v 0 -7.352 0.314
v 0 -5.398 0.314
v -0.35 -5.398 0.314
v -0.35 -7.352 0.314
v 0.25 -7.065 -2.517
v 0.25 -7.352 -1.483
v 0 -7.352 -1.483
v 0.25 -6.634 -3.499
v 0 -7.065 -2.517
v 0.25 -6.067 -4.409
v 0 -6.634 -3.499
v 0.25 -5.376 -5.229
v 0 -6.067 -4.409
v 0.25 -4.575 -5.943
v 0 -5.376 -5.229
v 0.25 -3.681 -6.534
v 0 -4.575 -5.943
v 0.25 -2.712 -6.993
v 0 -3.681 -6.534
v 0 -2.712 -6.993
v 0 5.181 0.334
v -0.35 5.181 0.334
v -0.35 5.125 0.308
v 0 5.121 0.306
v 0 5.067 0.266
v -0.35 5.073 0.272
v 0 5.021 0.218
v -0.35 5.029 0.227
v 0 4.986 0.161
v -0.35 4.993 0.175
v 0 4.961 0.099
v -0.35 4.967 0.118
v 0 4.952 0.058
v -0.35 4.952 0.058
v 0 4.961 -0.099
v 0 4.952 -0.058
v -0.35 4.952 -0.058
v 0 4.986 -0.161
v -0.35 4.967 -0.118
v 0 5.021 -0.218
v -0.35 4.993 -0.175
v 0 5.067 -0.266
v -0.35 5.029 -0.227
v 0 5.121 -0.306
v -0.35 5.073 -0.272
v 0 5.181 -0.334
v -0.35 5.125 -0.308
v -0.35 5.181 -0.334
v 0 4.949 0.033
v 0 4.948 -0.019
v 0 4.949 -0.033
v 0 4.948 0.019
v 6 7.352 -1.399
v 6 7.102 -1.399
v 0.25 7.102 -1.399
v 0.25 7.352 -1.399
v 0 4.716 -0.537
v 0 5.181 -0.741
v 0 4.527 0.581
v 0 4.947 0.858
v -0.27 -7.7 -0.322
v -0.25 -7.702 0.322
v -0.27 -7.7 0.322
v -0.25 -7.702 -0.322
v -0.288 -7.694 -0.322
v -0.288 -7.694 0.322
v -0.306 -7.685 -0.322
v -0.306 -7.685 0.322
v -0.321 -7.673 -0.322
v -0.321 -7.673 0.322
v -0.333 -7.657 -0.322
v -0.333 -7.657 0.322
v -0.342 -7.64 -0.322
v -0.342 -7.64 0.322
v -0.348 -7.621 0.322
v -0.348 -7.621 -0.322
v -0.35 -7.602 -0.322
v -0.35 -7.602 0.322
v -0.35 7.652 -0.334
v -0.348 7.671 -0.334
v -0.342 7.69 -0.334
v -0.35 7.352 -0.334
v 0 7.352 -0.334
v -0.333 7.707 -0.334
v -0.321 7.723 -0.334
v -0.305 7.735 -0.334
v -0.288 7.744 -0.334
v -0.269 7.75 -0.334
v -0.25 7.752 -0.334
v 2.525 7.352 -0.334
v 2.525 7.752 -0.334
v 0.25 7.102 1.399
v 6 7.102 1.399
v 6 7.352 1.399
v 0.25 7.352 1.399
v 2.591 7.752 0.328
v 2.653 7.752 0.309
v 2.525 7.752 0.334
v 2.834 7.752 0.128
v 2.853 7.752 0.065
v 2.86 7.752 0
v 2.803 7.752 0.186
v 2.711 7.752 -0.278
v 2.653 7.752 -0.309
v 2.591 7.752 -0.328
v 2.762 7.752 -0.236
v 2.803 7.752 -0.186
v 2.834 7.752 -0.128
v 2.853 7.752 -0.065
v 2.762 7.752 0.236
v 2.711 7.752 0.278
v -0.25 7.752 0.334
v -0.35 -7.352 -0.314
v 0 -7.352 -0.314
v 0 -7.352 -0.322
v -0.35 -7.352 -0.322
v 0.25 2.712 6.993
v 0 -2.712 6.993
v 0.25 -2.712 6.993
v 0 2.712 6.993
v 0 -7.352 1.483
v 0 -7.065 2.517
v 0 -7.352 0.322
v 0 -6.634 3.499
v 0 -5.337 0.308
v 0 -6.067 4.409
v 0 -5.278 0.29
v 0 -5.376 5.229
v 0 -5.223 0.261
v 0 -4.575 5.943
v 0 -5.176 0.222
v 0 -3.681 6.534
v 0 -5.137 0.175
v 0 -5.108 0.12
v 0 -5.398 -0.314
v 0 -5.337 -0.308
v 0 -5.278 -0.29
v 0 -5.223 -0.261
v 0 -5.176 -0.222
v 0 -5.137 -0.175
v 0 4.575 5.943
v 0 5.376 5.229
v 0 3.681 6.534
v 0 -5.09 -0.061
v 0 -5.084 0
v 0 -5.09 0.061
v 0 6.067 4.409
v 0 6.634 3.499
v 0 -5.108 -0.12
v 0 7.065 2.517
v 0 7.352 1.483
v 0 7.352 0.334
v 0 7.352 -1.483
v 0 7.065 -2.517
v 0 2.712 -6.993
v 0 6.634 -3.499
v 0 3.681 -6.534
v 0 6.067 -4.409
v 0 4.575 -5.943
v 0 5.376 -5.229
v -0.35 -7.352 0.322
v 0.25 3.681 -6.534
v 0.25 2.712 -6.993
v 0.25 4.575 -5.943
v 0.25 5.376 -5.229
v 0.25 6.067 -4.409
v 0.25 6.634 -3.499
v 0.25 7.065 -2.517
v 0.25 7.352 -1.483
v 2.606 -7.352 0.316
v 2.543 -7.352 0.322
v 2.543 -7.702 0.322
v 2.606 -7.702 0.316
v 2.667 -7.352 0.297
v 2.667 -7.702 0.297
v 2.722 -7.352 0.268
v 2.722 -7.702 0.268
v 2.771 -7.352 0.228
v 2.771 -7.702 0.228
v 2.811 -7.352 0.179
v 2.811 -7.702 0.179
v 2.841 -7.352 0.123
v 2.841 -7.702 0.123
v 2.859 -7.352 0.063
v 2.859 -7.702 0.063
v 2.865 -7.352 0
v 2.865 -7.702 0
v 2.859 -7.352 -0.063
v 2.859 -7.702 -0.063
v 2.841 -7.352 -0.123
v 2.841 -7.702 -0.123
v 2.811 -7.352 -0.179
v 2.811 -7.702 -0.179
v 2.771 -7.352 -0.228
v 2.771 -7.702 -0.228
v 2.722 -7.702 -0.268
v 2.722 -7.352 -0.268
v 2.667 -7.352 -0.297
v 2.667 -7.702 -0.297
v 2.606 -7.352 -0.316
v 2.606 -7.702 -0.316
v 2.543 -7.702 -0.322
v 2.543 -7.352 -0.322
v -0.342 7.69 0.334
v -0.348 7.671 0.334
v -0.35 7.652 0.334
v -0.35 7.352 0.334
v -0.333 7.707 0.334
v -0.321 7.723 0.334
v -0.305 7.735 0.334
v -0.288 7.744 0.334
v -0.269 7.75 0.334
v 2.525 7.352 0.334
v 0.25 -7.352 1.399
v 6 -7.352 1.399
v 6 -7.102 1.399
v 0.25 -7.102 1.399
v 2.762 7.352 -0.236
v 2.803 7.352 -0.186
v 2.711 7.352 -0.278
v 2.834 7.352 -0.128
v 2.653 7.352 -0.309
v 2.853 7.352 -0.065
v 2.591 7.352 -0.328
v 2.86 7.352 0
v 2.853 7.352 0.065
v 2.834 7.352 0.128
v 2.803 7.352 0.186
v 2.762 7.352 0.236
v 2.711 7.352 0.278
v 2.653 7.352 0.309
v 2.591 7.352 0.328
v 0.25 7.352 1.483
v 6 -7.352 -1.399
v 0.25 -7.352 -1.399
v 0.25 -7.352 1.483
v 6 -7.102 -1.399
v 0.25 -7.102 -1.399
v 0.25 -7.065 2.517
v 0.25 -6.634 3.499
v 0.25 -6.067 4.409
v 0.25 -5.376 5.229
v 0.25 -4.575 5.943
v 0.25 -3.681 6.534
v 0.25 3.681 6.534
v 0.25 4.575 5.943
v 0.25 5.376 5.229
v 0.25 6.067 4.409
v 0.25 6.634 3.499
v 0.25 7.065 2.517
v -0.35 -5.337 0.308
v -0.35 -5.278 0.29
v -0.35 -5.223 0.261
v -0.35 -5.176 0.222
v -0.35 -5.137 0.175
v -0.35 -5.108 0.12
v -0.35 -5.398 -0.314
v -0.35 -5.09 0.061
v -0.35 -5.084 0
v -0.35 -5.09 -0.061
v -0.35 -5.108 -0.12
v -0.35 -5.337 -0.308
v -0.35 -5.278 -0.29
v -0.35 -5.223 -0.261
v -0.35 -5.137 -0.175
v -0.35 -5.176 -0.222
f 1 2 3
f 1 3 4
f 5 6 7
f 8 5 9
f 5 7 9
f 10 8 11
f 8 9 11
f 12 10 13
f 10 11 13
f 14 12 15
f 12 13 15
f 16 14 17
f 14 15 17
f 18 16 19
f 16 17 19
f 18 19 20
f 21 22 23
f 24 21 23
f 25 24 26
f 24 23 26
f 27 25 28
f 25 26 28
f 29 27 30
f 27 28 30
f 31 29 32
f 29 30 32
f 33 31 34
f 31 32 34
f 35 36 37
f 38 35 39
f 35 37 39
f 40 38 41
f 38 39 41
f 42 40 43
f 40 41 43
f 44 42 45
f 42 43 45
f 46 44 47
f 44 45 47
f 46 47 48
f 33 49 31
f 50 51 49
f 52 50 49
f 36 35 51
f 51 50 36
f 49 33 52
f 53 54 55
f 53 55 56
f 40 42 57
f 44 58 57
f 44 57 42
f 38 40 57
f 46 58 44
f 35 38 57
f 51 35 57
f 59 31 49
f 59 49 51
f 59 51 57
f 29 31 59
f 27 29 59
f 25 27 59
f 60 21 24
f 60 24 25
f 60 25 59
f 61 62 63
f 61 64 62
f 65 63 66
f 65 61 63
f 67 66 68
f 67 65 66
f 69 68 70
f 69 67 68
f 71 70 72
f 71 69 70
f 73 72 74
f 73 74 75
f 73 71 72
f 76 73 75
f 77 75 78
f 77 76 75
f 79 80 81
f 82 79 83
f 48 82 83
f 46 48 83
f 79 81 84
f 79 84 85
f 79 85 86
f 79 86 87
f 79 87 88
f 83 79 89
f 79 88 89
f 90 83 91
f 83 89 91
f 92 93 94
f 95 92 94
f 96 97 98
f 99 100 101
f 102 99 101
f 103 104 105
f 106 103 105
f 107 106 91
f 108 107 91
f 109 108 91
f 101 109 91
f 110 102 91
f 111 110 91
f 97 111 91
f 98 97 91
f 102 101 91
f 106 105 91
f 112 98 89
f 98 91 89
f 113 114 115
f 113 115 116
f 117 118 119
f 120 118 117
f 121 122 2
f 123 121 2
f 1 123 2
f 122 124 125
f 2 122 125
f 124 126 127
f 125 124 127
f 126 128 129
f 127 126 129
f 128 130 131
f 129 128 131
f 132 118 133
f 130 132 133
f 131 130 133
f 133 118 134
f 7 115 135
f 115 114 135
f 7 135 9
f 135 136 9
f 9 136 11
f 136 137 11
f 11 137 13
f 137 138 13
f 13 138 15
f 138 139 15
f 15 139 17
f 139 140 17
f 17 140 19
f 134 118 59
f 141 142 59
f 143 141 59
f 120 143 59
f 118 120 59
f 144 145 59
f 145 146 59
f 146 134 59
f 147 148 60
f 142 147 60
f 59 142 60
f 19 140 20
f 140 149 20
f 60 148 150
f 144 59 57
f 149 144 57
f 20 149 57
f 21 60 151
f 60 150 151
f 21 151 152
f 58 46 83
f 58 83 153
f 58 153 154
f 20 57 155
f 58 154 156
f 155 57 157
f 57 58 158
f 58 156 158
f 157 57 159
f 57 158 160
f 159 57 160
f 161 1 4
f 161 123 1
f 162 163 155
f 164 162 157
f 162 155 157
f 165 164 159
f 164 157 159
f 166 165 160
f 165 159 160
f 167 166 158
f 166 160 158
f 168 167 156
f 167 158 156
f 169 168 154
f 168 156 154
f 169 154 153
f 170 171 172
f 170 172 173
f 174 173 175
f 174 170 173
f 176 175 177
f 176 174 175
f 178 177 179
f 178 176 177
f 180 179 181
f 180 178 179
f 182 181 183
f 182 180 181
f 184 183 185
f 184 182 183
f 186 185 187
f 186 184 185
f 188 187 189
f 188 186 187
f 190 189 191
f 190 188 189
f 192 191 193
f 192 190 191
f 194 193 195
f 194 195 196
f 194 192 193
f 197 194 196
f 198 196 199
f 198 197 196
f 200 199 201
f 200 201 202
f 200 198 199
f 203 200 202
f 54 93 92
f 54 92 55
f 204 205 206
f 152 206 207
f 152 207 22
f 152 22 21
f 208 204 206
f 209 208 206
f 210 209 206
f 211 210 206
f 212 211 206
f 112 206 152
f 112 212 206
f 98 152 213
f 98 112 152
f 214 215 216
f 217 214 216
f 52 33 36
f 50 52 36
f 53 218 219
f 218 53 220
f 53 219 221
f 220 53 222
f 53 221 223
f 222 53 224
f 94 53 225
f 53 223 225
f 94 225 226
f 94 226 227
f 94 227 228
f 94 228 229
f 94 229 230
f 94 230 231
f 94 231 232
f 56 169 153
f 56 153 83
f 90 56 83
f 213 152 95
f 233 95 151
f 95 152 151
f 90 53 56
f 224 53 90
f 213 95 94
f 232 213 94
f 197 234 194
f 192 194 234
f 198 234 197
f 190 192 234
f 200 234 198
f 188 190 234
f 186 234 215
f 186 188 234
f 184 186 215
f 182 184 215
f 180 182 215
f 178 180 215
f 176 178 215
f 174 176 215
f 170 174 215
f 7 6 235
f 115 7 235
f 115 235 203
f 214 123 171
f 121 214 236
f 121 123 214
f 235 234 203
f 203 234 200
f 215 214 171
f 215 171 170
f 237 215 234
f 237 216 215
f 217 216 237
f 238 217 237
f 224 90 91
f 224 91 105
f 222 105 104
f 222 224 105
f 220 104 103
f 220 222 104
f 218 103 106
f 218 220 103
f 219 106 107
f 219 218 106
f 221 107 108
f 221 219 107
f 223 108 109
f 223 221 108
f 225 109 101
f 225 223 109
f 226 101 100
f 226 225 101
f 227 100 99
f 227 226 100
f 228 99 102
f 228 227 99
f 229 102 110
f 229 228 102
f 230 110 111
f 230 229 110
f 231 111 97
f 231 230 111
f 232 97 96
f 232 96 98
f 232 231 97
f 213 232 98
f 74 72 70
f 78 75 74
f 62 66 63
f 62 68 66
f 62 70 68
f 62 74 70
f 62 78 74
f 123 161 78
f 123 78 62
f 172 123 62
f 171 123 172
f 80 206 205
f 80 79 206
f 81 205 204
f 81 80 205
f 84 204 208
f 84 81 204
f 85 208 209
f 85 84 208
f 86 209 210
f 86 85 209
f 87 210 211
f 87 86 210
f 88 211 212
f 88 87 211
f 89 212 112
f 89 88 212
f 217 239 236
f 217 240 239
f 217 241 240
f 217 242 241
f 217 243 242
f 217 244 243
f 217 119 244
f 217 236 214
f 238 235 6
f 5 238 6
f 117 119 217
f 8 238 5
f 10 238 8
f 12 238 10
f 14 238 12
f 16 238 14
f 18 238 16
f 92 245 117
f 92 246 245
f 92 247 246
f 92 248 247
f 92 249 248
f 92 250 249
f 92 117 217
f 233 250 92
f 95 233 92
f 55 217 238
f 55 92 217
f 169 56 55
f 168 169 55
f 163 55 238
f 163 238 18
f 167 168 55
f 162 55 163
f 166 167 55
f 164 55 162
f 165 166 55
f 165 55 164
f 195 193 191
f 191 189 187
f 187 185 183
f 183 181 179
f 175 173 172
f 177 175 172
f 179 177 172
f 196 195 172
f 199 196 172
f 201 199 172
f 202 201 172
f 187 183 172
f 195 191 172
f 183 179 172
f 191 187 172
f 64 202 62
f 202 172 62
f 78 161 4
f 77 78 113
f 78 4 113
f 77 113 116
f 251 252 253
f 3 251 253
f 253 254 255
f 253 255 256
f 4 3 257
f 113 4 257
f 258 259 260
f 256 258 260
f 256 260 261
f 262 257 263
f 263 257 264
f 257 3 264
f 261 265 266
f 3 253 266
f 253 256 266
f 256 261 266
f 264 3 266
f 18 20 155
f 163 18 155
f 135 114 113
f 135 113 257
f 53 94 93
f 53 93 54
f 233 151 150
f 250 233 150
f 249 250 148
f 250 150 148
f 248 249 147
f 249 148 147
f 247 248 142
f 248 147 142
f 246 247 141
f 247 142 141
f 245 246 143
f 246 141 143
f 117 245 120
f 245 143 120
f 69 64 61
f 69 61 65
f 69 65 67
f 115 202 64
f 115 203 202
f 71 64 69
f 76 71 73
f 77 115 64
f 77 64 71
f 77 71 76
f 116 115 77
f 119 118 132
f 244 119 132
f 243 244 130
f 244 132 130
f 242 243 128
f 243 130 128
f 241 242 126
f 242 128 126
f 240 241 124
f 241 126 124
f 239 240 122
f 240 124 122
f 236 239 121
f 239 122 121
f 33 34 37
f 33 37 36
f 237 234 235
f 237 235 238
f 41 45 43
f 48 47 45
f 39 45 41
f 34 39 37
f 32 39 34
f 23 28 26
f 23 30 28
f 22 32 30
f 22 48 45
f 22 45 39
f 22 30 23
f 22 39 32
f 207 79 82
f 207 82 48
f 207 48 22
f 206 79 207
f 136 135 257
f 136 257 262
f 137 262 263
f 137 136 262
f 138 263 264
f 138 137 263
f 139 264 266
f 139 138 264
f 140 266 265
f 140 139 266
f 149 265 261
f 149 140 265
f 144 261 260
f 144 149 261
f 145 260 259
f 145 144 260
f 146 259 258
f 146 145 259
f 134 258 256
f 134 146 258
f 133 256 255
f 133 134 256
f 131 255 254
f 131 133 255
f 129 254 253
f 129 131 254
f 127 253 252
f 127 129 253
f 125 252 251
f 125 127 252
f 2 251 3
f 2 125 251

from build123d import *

# Parameters (mm, degrees)
ESBO_O1_R                   = 7.5
RESSALTO_EXTRUS_O1_DEPTH    = 6
ESBO_O2_W                   = 3
ESBO_O2_H                   = 0.472136223
CORTE_EXTRUS_O1_DEPTH       = 6
ESBO_O3_W                   = 2.966826726
ESBO_O3_H                   = 0.25
RESSALTO_EXTRUS_O2_DEPTH    = 5.75
ESBO_O4_W                   = 22.809874316
ESBO_O4_H                   = 14.203670942
CORTE_EXTRUS_O2_DEPTH       = 5.75
ESBO_O5_W                   = 7.250675024
ESBO_O5_H                   = 15.25065993
CORTE_EXTRUS_O3_DEPTH       = 10.75
RESSALTO_EXTRUS_O3_DEPTH    = 0.35
RESSALTO_EXTRUS_O4_DEPTH    = 0.35
CORTE_EXTRUS_O5_DEPTH       = 16
CORTE_EXTRUS_O5_DEPTH_BACK  = 6.35
CORTE_EXTRUS_O6_DEPTH       = 7.35
CORTE_EXTRUS_O6_DEPTH_BACK  = 13
FILETE1_R                   = 0.1
RESSALTO_EXTRUS_O5_DEPTH    = 0.4
CORTE_EXTRUS_O7_DEPTH       = 0.4
ESBO_O14_W                  = 0.349889087
ESBO_O14_H                  = 0.668418636
RESSALTO_EXTRUS_O6_DEPTH    = 2.4
FILETE2_R                   = 0.1
CORTE_EXTRUS_O9_DEPTH       = 0.35
CORTE_EXTRUS_O10_DEPTH      = 15
CORTE_EXTRUS_O10_DEPTH_BACK = 7.35


with BuildPart() as part:
    # Esboço1 → Ressalto-extrusão1 (new body)
    with BuildSketch(Plane(origin=(0, 0, 0), x_dir=(0, 0, -1), z_dir=(1, 0, 0))):
        Circle(ESBO_O1_R)
    extrude(amount=RESSALTO_EXTRUS_O1_DEPTH)

    # Esboço2 → Corte-extrusão1 (cut)
    with BuildSketch(Plane.ZY):
        with Locations((0, 7.587903583)):
            Rectangle(ESBO_O2_W, ESBO_O2_H)
        with Locations((0, -7.587903583)):
            Rectangle(ESBO_O2_W, ESBO_O2_H)
    extrude(amount=-CORTE_EXTRUS_O1_DEPTH, mode=Mode.SUBTRACT)

    # Esboço3 → Ressalto-extrusão2 (add)
    with BuildSketch(Plane.ZY):
        with Locations((0, 7.226835471)):
            Rectangle(ESBO_O3_W, ESBO_O3_H)
        with Locations((0, -7.226835471)):
            Rectangle(ESBO_O3_W, ESBO_O3_H)
    extrude(amount=-RESSALTO_EXTRUS_O2_DEPTH)

    # Esboço4 → Corte-extrusão2 (cut)
    with BuildSketch(Plane(origin=(6, 0, 0), x_dir=(0, 0, -1), z_dir=(1, 0, 0))):
        Rectangle(ESBO_O4_W, ESBO_O4_H)
    extrude(amount=-CORTE_EXTRUS_O2_DEPTH, mode=Mode.SUBTRACT)

    # Esboço5 → Corte-extrusão3 (cut)
    with BuildSketch(Plane(origin=(0.25, 0, 0), x_dir=(0, 0, -1), z_dir=(1, 0, 0))):
        with Locations((5.024783907, 0)):
            Rectangle(ESBO_O5_W, ESBO_O5_H)
        Polygon((-1.399446395, -7.625329965), (-1.399446395, 7.625329965), (-5.165706312, 7.393925443), (-6.710731139, 7.999984905), (-9.487585404, 6.78786598), (-11.382898632, -7.206597972), align=None)
    extrude(amount=CORTE_EXTRUS_O3_DEPTH, mode=Mode.SUBTRACT)

    # Esboço6 → Ressalto-extrusão3 (add)
    with BuildSketch(Plane.XZ.offset(7.351835471)):
        with BuildLine():
            Line((-2.543494754, 0.321961033), (2.543494754, 0.321961033))
            ThreePointArc((2.543494754, 0.321961033), (2.865455786, 0), (2.543494754, -0.321961033))
            Line((2.543494754, -0.321961033), (-2.543494754, -0.321961033))
            ThreePointArc((-2.543494754, -0.321961033), (-2.865455786, 0), (-2.543494754, 0.321961033))
        make_face()
    extrude(amount=RESSALTO_EXTRUS_O3_DEPTH)

    # Esboço8 → Ressalto-extrusão4 (add)
    with BuildSketch(Plane.ZY):
        with BuildLine():
            Line((-0.314307146, -9.305679126), (-0.314307146, -5.397991816))
            ThreePointArc((-0.314307146, -5.397991816), (0, -5.08368467), (0.314307146, -5.397991816))
            Line((0.314307146, -5.397991816), (0.314307146, -9.305679126))
            ThreePointArc((0.314307146, -9.305679126), (0, -9.619986272), (-0.314307146, -9.305679126))
        make_face()
    extrude(amount=RESSALTO_EXTRUS_O4_DEPTH)

    # Esboço9 → Corte-extrusão5 (cut, two sides: drawn at the far end of the back side and taken through both)
    with BuildSketch(Plane(origin=(0, 0, -0.321961033), x_dir=(-1, 0, 0), z_dir=(0, 0, -1)).offset(-CORTE_EXTRUS_O5_DEPTH_BACK)):
        Polygon((0.35, -7.701835471), (0.35, -4.813290401), (3.812040174, -6.789850405), (3.701673879, -8.068450161), (1.08322938, -8.435064851), align=None)
    extrude(amount=CORTE_EXTRUS_O5_DEPTH + CORTE_EXTRUS_O5_DEPTH_BACK, mode=Mode.SUBTRACT)

    # Esboço10 → Corte-extrusão6 (cut, two sides: drawn at the far end of the back side and taken through both)
    with BuildSketch(Plane(origin=(0, 0, -0.314307146), x_dir=(-1, 0, 0), z_dir=(0, 0, -1)).offset(-CORTE_EXTRUS_O6_DEPTH_BACK)):
        Polygon((-0.161358156, -7.701835471), (0.859566955, -7.701835471), (0.859566955, -10.409050105), (-1.096747377, -10.331004379), align=None)
    extrude(amount=CORTE_EXTRUS_O6_DEPTH + CORTE_EXTRUS_O6_DEPTH_BACK, mode=Mode.SUBTRACT)

    # Filete1
    filete1_edges = [part.edges().sort_by_distance(p)[0] for p in [
        (-0.35, -7.701835471, 0),
    ]]
    fillet(filete1_edges, radius=FILETE1_R)

    # Esboço11 → Ressalto-extrusão5 (add)
    with BuildSketch(Plane(origin=(0, 7.351835471, 0), x_dir=(1, 0, 0), z_dir=(0, 1, 0))):
        with BuildLine():
            Line((-2.525437349, 0.334209318), (2.525437349, 0.334209318))
            ThreePointArc((2.525437349, 0.334209318), (2.859646667, 0), (2.525437349, -0.334209318))
            Line((2.525437349, -0.334209318), (-2.525437349, -0.334209318))
            ThreePointArc((-2.525437349, -0.334209318), (-2.859646667, 0), (-2.525437349, 0.334209318))
        make_face()
    extrude(amount=RESSALTO_EXTRUS_O5_DEPTH)

    # Esboço13 → Corte-extrusão7 (cut)
    with BuildSketch(Plane(origin=(0, 7.751835471, 0), x_dir=(1, 0, 0), z_dir=(0, 1, 0))):
        Polygon((-0.349889087, -0.334209318), (-0.349889087, 0.540947425), (-0.764471769, 0.572838401), (-3.134268128, 0.417702141), (-3.23158757, -0.84745061), (0, -1.013091695), align=None)
    extrude(amount=-CORTE_EXTRUS_O7_DEPTH, mode=Mode.SUBTRACT)

    # Esboço14 → Ressalto-extrusão6 (add)
    with BuildSketch(Plane.XZ.offset(-7.351835471)):
        with Locations((-0.174944544, 0)):
            Rectangle(ESBO_O14_W, ESBO_O14_H)
    extrude(amount=RESSALTO_EXTRUS_O6_DEPTH)

    # Filete2
    filete2_edges = [part.edges().sort_by_distance(p)[0] for p in [
        (-0.349889087, 7.751835471, 0),
    ]]
    fillet(filete2_edges, radius=FILETE2_R)

    # Esboço15 → Corte-extrusão9 (cut)
    with BuildSketch(Plane.ZY.offset(0.349889087)):
        with BuildLine():
            Line((-0.334209318, 5.181370585), (-0.740677409, 5.181370585))
            Line((-0.740677409, 5.181370585), (-0.537443364, 4.71563988))
            Line((-0.537443364, 4.71563988), (0.580990807, 4.526830135))
            Line((0.580990807, 4.526830135), (0.857911766, 4.947135876))
            Line((0.857911766, 4.947135876), (0.334209318, 5.181370585))
            ThreePointArc((0.334209318, 5.181370585), (0, 4.947135876), (-0.334209318, 5.181370585))
        make_face()
    extrude(amount=-CORTE_EXTRUS_O9_DEPTH, mode=Mode.SUBTRACT)

    # Esboço19 → Corte-extrusão10 (cut, two sides: drawn at the far end of the back side and taken through both)
    with BuildSketch(Plane(origin=(0.25, 0, 0), x_dir=(0, 0, -1), z_dir=(1, 0, 0)).offset(-CORTE_EXTRUS_O10_DEPTH_BACK)):
        Polygon((-6.992682683, 8.188928042), (-12.721348099, -3.80184127), (-6.992682683, -8.188928042), align=None)
        Polygon((6.992682683, -8.188928042), (6.992682683, 8.188928042), (11.074646704, 2.193543386), align=None)
    extrude(amount=CORTE_EXTRUS_O10_DEPTH + CORTE_EXTRUS_O10_DEPTH_BACK, mode=Mode.SUBTRACT)


solid = part.part
